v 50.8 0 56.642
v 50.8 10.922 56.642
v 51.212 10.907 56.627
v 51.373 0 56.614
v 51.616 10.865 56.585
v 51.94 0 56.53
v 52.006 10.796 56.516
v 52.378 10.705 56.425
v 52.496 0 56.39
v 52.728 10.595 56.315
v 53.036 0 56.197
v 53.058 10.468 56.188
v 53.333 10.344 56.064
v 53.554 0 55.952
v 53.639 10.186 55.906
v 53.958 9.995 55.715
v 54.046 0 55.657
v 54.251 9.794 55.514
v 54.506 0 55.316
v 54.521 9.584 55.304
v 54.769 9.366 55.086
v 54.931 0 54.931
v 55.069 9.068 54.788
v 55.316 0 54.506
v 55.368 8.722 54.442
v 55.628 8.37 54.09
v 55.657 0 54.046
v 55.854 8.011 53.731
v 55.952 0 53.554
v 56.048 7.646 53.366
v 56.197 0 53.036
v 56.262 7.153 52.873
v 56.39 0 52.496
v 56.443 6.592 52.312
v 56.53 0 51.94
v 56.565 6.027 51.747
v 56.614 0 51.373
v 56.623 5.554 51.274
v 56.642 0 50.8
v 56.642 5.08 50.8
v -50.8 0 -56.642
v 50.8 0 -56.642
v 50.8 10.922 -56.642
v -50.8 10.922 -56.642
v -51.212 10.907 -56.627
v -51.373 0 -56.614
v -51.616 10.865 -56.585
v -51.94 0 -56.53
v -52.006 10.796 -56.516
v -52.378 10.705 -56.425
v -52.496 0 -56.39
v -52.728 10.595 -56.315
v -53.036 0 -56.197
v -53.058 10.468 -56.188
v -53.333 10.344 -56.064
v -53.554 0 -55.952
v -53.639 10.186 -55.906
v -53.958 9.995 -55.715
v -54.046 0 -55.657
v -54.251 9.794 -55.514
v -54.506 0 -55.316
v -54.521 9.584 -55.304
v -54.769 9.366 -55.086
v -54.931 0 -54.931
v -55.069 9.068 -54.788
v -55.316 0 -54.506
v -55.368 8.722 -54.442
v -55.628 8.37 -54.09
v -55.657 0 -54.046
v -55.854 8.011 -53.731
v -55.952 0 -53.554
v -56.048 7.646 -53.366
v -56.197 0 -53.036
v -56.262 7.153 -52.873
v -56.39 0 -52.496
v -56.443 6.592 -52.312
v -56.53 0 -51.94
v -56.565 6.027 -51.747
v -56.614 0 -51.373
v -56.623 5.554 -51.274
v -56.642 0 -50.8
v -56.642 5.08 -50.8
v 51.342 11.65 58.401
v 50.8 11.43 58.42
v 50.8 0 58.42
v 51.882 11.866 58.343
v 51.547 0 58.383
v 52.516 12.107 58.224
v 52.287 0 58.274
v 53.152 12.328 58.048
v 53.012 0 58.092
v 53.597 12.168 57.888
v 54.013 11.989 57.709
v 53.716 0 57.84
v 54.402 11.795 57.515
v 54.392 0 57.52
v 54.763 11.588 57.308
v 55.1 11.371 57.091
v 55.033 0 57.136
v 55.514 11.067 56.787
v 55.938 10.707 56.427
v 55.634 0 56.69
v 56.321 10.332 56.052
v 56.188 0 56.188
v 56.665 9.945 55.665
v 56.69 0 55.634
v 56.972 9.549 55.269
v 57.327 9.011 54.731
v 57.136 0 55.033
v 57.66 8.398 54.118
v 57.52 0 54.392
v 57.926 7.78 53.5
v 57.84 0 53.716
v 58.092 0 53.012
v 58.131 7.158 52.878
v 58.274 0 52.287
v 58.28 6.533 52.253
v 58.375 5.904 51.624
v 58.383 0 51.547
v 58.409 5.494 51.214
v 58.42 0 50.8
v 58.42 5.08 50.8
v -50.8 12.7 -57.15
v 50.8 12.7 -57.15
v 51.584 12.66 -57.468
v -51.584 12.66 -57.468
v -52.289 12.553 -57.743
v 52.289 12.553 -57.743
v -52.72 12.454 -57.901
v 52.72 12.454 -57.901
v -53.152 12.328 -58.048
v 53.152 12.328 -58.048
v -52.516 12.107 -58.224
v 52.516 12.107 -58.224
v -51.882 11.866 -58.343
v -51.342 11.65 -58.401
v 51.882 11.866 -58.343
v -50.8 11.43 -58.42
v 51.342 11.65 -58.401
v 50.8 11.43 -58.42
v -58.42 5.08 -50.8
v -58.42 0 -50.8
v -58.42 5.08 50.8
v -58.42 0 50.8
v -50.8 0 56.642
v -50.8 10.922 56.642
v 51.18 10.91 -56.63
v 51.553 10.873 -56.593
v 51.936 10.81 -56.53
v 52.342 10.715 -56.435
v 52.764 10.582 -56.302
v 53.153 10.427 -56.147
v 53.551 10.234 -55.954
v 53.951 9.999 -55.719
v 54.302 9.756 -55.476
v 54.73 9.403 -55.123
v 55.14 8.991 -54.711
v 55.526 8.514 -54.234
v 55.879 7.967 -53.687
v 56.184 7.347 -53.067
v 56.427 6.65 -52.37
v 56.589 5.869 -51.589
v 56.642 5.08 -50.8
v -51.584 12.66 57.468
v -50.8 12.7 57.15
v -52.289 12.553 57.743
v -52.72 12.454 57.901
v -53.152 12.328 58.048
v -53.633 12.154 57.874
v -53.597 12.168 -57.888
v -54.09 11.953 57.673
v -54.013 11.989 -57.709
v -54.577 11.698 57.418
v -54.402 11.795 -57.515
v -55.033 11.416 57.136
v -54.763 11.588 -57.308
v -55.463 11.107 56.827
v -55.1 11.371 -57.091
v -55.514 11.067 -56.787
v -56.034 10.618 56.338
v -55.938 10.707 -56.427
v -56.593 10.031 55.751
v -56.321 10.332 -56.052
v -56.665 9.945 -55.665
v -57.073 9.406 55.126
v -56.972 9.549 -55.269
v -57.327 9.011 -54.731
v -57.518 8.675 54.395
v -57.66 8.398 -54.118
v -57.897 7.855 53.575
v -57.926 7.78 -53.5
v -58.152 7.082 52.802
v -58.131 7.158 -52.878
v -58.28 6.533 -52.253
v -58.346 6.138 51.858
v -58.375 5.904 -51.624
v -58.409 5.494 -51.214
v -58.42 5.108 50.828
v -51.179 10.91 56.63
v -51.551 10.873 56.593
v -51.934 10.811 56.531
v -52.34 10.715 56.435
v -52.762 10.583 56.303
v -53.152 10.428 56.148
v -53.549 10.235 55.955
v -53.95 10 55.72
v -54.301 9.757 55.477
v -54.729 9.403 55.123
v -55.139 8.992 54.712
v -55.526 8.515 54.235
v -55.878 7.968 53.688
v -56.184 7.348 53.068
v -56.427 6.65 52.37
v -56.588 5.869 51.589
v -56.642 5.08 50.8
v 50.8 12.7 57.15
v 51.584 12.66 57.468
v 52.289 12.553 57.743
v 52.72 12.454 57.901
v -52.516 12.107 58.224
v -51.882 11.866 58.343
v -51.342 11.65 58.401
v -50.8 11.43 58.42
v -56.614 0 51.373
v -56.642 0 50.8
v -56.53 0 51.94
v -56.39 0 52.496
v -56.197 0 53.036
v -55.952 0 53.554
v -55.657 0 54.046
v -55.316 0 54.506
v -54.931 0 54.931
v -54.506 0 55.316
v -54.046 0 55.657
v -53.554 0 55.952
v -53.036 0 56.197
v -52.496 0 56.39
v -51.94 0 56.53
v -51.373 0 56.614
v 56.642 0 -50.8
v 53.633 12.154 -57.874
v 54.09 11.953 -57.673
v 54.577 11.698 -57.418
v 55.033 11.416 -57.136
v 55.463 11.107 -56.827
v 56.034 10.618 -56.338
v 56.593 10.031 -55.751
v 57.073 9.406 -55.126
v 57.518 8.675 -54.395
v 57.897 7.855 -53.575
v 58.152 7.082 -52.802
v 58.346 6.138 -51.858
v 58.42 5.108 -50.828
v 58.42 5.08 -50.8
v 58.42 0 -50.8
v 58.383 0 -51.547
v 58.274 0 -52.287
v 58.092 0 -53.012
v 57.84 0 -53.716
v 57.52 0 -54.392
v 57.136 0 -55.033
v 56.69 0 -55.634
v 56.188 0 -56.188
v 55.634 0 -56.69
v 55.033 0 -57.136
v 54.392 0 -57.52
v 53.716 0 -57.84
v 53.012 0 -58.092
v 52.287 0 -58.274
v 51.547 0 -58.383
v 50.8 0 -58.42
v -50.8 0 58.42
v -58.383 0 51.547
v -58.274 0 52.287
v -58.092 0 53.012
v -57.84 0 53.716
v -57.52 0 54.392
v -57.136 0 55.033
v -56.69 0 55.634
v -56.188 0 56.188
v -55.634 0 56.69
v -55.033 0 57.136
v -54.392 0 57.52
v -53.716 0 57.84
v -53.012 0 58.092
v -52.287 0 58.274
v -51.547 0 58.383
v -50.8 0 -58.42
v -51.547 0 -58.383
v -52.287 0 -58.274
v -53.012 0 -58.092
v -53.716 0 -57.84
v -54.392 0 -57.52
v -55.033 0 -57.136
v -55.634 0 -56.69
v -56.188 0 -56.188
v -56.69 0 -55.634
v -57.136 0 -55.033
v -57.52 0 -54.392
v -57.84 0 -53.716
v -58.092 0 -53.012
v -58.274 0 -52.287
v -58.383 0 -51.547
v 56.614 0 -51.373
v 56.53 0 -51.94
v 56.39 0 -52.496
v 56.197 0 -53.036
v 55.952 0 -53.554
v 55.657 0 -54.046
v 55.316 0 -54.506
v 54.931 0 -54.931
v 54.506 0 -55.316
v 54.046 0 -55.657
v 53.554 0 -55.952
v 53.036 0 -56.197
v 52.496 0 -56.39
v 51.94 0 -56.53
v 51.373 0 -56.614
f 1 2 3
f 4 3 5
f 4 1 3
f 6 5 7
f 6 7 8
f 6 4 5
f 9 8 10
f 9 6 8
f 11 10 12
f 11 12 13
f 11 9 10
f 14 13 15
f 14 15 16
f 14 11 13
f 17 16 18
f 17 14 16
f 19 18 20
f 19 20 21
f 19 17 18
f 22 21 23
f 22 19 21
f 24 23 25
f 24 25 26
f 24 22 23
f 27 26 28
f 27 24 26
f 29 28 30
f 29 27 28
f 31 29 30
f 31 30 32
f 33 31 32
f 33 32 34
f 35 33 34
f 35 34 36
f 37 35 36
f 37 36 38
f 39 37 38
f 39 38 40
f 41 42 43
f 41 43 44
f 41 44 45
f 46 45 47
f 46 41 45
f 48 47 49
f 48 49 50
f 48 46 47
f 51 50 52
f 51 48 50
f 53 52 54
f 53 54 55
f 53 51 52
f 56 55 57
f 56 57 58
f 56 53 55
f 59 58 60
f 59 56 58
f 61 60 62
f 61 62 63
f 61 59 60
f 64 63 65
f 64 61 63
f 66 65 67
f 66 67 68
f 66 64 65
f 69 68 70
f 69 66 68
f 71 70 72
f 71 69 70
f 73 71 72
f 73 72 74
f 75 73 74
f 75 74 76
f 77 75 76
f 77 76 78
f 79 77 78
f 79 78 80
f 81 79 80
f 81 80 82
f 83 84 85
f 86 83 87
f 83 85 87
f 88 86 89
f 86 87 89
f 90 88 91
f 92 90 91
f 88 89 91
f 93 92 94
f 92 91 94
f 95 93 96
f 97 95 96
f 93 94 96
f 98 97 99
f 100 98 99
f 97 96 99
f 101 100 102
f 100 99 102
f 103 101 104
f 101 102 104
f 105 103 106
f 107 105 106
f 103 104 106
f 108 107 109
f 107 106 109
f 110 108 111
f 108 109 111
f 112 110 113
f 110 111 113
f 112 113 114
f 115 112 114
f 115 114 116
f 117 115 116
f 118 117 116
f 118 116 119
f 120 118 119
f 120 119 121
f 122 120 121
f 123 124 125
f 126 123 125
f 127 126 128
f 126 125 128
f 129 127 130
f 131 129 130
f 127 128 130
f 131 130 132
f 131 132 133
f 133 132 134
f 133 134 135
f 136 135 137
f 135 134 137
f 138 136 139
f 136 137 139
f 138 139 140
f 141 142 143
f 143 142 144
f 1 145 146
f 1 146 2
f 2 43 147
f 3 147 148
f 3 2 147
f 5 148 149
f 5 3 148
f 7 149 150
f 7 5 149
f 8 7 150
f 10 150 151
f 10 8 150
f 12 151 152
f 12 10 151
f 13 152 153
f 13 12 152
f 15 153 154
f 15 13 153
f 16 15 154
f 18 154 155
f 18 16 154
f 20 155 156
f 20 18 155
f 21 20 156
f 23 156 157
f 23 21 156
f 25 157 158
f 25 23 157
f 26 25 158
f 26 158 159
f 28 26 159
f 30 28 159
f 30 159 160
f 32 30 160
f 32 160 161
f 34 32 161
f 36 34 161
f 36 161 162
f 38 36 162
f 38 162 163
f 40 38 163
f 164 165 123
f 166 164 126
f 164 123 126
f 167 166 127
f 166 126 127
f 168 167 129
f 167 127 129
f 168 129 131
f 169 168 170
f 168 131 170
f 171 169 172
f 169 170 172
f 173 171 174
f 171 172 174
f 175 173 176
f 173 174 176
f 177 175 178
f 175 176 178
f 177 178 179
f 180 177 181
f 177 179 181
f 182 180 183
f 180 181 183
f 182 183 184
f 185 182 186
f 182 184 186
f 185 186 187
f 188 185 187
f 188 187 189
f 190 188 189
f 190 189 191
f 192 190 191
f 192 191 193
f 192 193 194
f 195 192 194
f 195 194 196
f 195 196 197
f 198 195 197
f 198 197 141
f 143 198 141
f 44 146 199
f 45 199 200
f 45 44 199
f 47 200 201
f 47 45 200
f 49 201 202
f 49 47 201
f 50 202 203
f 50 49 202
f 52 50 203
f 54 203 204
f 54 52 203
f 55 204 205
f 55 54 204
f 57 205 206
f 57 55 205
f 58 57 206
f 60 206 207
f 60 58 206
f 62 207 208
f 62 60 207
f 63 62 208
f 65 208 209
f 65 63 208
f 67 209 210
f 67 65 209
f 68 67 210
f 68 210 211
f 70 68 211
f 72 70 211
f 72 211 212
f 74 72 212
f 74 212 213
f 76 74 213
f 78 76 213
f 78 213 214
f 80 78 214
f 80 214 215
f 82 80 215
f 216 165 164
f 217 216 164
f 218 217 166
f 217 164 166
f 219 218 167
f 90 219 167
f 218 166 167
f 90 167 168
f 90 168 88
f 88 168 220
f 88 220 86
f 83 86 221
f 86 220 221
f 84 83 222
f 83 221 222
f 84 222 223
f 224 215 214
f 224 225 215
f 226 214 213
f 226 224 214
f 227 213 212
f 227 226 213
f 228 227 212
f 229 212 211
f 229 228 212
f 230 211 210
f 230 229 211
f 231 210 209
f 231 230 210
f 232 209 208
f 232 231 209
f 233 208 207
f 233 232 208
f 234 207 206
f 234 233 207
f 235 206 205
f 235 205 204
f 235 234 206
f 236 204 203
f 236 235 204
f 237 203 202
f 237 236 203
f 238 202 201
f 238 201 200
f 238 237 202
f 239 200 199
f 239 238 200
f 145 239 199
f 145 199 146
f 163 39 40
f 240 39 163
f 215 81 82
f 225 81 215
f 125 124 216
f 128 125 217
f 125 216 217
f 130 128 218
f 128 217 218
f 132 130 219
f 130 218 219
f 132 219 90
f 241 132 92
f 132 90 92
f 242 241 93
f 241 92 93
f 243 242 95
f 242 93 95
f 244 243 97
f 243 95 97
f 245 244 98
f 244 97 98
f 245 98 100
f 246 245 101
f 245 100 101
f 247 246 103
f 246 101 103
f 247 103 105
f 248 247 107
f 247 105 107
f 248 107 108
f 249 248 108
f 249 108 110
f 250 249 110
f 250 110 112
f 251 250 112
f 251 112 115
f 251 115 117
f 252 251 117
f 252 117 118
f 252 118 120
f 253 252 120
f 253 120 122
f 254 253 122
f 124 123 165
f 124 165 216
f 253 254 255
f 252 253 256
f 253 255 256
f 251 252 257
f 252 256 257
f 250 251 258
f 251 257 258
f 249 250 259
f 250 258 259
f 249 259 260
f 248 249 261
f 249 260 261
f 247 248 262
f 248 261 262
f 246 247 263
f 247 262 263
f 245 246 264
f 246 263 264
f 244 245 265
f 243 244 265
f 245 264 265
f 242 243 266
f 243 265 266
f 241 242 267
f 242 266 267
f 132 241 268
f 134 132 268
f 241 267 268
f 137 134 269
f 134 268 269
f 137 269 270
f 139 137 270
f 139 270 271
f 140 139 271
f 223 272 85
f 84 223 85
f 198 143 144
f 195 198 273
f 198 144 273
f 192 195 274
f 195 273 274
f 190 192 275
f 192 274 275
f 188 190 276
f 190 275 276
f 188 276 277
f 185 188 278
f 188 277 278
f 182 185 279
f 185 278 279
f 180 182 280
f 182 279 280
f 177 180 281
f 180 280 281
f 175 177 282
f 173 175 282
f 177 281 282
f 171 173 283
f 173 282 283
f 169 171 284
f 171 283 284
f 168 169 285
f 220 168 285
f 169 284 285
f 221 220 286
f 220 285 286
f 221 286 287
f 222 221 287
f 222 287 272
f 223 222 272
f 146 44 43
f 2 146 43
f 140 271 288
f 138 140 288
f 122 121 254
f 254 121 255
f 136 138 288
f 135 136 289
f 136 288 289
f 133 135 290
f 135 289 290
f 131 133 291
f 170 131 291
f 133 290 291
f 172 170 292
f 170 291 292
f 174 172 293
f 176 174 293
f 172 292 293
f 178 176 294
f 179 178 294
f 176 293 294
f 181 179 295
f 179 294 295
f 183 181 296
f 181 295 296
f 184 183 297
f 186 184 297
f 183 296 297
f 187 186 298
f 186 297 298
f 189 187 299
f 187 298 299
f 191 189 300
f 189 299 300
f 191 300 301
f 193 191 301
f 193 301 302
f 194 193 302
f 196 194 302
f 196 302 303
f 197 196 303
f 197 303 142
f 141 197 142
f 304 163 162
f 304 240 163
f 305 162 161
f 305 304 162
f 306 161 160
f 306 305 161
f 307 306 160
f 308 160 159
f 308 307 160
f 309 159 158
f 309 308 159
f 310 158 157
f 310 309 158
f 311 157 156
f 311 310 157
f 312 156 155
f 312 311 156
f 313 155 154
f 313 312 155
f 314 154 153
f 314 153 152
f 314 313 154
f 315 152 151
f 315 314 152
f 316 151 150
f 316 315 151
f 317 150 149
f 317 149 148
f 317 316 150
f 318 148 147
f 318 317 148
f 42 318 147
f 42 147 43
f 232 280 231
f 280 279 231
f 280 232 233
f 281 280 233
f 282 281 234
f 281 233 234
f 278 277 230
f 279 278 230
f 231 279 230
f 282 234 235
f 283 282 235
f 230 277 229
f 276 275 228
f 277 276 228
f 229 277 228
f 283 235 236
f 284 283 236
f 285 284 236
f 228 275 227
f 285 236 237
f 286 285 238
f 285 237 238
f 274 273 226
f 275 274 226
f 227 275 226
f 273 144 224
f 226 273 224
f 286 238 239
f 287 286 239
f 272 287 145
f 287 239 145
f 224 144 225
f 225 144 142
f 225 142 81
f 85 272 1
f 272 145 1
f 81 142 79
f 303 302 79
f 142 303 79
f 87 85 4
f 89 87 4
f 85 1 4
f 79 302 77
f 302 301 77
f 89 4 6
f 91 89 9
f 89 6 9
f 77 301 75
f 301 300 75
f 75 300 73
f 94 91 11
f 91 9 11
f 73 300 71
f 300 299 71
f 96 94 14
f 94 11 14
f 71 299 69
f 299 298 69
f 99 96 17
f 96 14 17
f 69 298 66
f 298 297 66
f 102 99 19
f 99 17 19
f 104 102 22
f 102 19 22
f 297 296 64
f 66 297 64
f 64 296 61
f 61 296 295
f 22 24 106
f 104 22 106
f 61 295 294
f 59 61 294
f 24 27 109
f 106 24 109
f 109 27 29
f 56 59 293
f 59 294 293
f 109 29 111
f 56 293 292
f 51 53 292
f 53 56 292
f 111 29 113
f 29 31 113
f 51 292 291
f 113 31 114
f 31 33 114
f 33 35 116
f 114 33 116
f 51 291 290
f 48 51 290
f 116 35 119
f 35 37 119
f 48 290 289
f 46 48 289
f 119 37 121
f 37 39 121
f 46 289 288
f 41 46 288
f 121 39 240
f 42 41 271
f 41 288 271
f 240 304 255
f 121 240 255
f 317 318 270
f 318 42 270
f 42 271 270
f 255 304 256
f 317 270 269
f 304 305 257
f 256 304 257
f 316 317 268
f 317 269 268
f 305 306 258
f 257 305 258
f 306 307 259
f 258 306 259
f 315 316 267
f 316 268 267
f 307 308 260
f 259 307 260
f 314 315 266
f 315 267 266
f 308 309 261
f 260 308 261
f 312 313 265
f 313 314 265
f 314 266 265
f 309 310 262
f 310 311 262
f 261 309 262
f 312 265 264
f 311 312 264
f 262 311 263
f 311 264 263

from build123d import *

# Parameters (mm, degrees)
BOSS_EXTRUDE1_DEPTH = 12.7
FILLET1_R           = 7.62
FILLET3_R           = 1.27
SHELL1_T            = -1.778


with BuildPart() as part:
    # Sketch2 → Boss-Extrude1 (new body)
    with BuildSketch(Plane(origin=(0, 0, 0), x_dir=(1, 0, 0), z_dir=(0, 1, 0))):
        with BuildLine():
            Line((-50.8, -58.42), (50.8, -58.42))
            ThreePointArc((50.8, -58.42), (56.188153673, -56.188153673), (58.42, -50.8))
            Line((58.42, -50.8), (58.42, 50.8))
            ThreePointArc((58.42, 50.8), (56.188153673, 56.188153673), (50.8, 58.42))
            Line((50.8, 58.42), (-50.8, 58.42))
            ThreePointArc((-50.8, 58.42), (-56.188153673, 56.188153673), (-58.42, 50.8))
            Line((-58.42, 50.8), (-58.42, -50.8))
            ThreePointArc((-58.42, -50.8), (-56.188153673, -56.188153673), (-50.8, -58.42))
        make_face()
    extrude(amount=BOSS_EXTRUDE1_DEPTH)

    # Fillet1
    # the kernel refuses this fillet: 7.62 mm, written as the material it takes off along each edge
    with BuildSketch(Plane(origin=(58.42, 12.7, 69.85), x_dir=(0, -1, 0), z_dir=(0, 0, -1)), Plane(origin=(-58.42, 12.7, -69.85), x_dir=(0, -1, 0), z_dir=(0, 0, 1))) as fillet1_piece_1:
        with BuildLine():
            CenterArc((FILLET1_R, FILLET1_R), FILLET1_R, 180, 90)
            Line((0, FILLET1_R), (0, 0))
            Line((0, 0), (FILLET1_R, 0))
        make_face()
    extrude(amount=139.7, mode=Mode.SUBTRACT)

    # Fillet3
    # the kernel refuses this fillet: 1.27 mm, written as the material it takes off along each edge
    with BuildSketch(Plane(origin=(53.975, 12.7, -58.42), x_dir=(0, 0, 1), z_dir=(-1, 0, 0))) as fillet3_piece_1:
        with BuildLine():
            CenterArc((FILLET3_R, -FILLET3_R), FILLET3_R, 90, 90)
            Line((0, -FILLET3_R), (0, 0))
            Line((0, 0), (FILLET3_R, 0))
        make_face()
    extrude(amount=107.95, mode=Mode.SUBTRACT)
    with BuildSketch(Plane(origin=(-53.975, 12.7, 58.42), x_dir=(0, -1, 0), z_dir=(1, 0, 0))) as fillet3_piece_2:
        with BuildLine():
            CenterArc((FILLET3_R, FILLET3_R), FILLET3_R, 180, 90)
            Line((0, FILLET3_R), (0, 0))
            Line((0, 0), (FILLET3_R, 0))
        make_face()
    extrude(amount=107.95, mode=Mode.SUBTRACT)

    # Shell1
    shell1_openings = [part.faces().sort_by_distance(p)[0] for p in [
        (0, 0, 0),
    ]]
    offset(amount=SHELL1_T, openings=shell1_openings)


solid = part.part
